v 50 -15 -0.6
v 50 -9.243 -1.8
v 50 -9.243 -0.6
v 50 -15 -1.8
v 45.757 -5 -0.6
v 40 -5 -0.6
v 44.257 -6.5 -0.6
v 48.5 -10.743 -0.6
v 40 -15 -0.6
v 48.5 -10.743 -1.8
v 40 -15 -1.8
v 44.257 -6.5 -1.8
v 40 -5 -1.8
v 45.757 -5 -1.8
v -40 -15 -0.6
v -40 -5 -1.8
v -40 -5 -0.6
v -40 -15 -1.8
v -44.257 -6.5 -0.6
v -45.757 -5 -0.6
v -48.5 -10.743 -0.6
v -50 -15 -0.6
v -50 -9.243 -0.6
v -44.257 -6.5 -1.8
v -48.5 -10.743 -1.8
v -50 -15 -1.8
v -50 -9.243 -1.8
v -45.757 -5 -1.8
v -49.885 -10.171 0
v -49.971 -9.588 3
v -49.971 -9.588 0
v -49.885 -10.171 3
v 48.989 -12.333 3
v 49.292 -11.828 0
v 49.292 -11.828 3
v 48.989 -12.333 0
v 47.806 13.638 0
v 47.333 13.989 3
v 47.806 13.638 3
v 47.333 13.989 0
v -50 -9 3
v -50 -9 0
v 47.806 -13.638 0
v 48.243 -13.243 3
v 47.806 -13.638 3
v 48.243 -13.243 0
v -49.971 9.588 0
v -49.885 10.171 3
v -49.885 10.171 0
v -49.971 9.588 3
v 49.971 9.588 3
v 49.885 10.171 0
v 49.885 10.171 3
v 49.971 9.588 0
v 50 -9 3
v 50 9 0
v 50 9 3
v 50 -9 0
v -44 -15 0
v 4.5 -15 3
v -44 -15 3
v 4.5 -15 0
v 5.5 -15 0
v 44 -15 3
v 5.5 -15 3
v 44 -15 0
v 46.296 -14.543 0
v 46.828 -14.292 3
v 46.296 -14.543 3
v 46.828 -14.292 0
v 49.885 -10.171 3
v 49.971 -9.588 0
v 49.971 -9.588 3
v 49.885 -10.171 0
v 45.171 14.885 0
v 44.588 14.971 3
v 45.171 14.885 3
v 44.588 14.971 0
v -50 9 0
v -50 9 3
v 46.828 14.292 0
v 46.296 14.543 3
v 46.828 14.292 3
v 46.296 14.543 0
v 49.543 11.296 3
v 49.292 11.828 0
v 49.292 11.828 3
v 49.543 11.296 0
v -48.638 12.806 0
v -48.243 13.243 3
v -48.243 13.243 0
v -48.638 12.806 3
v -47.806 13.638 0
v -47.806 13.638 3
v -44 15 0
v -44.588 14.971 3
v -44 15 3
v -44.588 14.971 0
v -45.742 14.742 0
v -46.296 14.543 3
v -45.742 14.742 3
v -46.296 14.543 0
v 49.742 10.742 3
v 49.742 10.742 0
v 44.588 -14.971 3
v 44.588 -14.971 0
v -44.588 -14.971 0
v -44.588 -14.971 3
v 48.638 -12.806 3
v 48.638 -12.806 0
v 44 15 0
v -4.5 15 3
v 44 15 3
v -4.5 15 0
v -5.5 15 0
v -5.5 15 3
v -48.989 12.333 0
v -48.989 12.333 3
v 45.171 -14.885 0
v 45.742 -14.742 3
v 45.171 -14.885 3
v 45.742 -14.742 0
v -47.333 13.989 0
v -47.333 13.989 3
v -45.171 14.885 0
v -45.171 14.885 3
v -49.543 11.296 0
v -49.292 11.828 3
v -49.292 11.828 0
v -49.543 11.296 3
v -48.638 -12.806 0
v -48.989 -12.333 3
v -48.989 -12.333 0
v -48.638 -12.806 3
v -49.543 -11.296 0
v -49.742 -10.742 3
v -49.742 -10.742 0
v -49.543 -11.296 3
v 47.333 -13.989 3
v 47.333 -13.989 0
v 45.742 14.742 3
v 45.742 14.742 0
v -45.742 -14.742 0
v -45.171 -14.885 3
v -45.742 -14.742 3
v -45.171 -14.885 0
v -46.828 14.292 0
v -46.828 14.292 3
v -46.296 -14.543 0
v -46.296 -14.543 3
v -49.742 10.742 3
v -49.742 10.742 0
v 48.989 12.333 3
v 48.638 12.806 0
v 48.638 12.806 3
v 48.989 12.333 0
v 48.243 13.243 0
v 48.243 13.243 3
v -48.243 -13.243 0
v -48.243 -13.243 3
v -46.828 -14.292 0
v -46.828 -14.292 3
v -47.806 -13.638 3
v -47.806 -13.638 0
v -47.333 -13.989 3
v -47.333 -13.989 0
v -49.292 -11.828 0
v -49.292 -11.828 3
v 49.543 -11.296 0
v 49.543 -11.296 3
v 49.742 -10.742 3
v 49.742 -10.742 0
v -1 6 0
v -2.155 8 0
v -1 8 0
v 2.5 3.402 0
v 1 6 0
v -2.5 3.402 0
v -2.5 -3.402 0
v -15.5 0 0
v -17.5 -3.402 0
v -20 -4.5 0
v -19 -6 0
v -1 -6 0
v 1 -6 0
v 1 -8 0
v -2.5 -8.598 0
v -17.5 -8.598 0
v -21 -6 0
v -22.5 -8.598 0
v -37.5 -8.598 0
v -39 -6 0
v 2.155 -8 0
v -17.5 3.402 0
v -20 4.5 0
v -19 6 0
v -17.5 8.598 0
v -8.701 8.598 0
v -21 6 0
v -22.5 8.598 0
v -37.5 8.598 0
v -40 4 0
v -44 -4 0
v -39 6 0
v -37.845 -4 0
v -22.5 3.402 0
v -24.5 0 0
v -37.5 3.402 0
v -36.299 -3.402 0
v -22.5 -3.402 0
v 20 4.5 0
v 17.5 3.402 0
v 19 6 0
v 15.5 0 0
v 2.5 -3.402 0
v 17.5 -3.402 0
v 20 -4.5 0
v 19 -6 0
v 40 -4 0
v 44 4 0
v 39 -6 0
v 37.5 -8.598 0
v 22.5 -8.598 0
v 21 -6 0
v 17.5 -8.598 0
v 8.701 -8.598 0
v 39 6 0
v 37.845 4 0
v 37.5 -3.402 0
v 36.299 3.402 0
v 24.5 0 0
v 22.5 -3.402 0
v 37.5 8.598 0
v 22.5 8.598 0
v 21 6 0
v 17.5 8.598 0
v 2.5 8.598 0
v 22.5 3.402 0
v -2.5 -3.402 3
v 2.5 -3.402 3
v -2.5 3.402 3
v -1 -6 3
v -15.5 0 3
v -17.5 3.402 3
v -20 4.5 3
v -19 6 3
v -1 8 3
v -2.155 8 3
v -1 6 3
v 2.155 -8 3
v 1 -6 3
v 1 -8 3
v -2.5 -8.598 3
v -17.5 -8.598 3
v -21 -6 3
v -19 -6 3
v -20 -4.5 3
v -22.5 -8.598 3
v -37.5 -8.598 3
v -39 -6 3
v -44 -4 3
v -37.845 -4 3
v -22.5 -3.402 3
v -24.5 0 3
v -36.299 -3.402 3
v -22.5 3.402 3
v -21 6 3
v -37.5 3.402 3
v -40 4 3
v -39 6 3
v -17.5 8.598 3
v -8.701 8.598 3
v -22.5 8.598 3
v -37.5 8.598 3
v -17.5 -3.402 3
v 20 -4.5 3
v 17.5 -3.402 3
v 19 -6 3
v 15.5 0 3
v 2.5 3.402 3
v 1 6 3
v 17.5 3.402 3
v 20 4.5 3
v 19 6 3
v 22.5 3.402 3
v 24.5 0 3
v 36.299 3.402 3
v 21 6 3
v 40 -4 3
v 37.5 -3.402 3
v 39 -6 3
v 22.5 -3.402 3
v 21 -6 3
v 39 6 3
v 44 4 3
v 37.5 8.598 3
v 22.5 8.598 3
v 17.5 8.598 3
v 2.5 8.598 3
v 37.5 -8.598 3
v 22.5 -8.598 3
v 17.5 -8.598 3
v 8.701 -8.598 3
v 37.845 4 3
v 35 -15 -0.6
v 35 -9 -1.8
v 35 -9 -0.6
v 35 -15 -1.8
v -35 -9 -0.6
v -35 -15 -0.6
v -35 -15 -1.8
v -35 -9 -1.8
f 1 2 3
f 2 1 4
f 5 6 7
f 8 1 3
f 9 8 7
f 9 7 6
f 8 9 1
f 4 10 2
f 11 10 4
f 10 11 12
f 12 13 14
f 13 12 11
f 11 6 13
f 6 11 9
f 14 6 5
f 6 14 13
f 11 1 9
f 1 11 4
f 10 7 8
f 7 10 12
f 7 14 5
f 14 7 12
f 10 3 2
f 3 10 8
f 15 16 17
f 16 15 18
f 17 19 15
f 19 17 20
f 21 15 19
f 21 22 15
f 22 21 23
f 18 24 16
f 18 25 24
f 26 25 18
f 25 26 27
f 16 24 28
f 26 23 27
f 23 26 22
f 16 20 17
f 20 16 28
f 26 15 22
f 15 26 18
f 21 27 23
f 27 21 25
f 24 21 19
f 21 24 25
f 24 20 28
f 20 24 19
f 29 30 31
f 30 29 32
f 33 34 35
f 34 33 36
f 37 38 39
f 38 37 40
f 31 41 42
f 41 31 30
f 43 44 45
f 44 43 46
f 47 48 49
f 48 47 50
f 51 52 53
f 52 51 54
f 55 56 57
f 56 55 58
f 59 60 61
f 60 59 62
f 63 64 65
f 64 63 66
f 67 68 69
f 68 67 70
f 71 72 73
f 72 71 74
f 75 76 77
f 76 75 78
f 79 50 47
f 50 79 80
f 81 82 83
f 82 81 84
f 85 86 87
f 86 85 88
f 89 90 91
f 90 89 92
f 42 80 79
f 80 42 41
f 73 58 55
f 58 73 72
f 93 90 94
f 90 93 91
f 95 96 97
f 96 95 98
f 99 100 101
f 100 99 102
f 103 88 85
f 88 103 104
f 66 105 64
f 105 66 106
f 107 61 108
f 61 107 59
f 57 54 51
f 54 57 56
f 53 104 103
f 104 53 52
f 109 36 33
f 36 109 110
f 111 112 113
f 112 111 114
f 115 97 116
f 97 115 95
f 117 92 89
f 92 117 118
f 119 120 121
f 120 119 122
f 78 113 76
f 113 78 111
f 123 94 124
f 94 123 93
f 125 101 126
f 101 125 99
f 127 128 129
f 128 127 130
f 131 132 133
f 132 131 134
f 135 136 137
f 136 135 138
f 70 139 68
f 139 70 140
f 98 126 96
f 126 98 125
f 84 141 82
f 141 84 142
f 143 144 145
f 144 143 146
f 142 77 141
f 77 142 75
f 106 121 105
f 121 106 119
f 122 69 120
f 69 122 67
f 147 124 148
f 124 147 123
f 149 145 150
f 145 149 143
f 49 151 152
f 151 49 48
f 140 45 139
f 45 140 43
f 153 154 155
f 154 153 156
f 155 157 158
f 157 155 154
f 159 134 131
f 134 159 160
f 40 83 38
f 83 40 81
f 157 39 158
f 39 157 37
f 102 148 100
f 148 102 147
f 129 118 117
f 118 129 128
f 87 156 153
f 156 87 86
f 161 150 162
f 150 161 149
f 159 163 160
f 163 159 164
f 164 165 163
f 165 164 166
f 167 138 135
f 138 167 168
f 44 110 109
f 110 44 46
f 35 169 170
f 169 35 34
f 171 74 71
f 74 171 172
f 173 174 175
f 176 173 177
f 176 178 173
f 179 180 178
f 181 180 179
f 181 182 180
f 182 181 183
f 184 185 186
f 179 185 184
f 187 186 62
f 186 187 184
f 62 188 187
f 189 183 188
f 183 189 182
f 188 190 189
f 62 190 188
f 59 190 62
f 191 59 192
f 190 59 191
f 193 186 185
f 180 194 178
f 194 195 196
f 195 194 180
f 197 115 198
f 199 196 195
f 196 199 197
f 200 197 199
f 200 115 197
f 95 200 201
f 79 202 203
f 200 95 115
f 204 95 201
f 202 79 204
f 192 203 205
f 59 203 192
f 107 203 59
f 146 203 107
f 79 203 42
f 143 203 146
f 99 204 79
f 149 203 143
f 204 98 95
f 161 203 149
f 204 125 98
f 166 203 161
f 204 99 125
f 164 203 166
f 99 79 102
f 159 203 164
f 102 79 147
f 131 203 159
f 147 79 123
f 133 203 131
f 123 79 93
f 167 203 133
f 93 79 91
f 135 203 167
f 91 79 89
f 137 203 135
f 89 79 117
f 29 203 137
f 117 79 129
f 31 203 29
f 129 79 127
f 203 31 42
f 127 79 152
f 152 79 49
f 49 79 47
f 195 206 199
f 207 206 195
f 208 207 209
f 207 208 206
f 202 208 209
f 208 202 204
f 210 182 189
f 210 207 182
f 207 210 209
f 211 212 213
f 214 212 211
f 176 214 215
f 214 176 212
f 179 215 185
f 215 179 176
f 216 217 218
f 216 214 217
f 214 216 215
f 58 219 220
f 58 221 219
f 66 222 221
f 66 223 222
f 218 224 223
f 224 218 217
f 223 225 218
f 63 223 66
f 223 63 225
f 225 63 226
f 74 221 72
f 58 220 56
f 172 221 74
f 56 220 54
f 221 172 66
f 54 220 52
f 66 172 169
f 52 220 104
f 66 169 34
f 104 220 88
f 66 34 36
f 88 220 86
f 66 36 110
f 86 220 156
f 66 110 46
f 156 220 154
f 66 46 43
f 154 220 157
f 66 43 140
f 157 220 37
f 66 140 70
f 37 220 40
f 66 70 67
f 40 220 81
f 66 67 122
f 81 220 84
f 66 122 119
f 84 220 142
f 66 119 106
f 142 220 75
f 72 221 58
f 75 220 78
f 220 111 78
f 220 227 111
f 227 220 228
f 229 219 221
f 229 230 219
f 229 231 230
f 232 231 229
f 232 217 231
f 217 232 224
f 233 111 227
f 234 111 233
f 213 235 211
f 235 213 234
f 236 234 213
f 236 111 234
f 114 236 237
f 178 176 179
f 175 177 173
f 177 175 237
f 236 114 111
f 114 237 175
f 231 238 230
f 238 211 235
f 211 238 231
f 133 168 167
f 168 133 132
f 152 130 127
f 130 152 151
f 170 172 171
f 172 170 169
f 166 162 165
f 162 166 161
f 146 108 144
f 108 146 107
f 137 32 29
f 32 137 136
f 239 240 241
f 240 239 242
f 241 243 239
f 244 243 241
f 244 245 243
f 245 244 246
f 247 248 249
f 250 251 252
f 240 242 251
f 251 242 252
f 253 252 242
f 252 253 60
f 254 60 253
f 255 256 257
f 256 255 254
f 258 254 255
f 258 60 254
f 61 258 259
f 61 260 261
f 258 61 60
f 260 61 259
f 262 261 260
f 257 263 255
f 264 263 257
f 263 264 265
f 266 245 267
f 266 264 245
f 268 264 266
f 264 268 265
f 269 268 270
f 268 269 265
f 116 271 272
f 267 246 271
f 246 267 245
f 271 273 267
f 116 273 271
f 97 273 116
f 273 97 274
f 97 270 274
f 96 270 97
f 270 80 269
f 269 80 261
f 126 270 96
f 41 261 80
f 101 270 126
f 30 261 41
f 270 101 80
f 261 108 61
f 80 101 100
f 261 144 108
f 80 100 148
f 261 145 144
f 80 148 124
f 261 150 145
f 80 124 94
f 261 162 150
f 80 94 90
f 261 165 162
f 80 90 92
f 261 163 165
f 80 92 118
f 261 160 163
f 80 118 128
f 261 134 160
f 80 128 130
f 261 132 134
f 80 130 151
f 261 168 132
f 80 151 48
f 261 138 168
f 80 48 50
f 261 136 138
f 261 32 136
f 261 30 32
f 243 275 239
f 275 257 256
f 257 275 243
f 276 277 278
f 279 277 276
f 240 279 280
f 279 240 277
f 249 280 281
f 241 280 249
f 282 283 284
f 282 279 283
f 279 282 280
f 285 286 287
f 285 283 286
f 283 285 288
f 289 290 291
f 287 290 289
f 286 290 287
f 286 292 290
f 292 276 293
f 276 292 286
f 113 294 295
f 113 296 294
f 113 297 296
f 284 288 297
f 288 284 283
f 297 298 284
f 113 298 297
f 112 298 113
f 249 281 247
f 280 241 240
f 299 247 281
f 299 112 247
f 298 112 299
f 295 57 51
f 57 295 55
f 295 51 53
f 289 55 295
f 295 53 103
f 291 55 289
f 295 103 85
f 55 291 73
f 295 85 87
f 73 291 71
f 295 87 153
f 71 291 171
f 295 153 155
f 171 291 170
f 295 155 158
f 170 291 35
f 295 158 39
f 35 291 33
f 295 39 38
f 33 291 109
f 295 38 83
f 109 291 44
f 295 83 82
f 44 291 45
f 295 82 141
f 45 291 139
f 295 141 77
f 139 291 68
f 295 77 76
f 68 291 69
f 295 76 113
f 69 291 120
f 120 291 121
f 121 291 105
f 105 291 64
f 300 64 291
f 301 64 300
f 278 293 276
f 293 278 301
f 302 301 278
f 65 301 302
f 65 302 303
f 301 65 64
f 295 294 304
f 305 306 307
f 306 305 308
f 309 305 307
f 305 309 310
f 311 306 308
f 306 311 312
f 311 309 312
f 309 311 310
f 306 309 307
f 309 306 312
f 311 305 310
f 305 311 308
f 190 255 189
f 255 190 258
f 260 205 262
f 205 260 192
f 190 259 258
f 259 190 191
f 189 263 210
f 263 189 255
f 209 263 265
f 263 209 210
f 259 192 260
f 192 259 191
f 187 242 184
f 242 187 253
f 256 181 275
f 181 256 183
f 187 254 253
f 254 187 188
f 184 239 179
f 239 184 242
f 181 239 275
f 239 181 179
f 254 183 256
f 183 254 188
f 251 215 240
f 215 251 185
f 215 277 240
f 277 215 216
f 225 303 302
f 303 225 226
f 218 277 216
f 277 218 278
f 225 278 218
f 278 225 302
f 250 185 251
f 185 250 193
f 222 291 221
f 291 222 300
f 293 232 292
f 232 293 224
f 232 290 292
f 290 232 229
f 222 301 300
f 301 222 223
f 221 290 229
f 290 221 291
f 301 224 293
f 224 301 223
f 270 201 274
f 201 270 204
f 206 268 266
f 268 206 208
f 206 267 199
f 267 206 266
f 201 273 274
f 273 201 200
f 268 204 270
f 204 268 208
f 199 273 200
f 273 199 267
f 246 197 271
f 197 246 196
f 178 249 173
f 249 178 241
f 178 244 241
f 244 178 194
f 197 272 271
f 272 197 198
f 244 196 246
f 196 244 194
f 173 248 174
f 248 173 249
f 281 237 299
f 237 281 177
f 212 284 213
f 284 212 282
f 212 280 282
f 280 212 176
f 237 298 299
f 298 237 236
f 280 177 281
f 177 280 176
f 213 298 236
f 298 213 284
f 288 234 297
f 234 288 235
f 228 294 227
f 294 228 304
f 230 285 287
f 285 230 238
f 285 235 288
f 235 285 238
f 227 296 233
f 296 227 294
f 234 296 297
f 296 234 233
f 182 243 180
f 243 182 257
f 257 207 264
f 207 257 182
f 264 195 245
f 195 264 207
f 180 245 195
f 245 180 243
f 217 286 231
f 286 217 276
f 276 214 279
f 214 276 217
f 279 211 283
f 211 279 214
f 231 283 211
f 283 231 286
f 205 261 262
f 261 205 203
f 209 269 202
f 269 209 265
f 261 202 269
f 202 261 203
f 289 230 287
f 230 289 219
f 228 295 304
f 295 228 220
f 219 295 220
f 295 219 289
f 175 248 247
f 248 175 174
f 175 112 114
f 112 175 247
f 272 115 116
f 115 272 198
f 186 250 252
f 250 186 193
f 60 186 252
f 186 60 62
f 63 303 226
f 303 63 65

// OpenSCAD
$fn=64;

L = 100;
W = 30;
T = 3;

corner_r = 6;

step_len = 70;
step_w = 6;
step_h = 1.2;

chamfer_block_len = 10;
chamfer_block_w = 10;
chamfer_block_h = 1.2;
chamfer = 3;

module rounded_rect_2d(l, w, r){
    hull(){
        translate([ l/2 - r,  w/2 - r]) circle(r=r);
        translate([-l/2 + r,  w/2 - r]) circle(r=r);
        translate([ l/2 - r, -w/2 + r]) circle(r=r);
        translate([-l/2 + r, -w/2 + r]) circle(r=r);
    }
}

module plate_body(){
    linear_extrude(height=T)
        rounded_rect_2d(L, W, corner_r);
}

module stepped_base(){
    translate([0, -W/2 + step_w/2, -step_h])
        cube([step_len, step_w, step_h], center=true);
}

module chamfer_block(signx=1){
    x0 = signx*(L/2 - chamfer_block_len/2);
    y0 = -W/2 + chamfer_block_w/2;
    translate([x0, y0, -chamfer_block_h])
    difference(){
        cube([chamfer_block_len, chamfer_block_w, chamfer_block_h], center=true);
        translate([signx*(chamfer_block_len/2 - chamfer/2), chamfer_block_w/2 - chamfer/2, 0])
            rotate([0,0,45])
                cube([chamfer*2, chamfer*2, chamfer_block_h+0.2], center=true);
    }
}

module hex_slot_2d(len=18, w=6){
    r = w/2;
    hull(){
        translate([-len/2 + r, 0]) circle(r=r, $fn=6);
        translate([ len/2 - r, 0]) circle(r=r, $fn=6);
    }
}

module diamond_2d(w=8, h=8){
    polygon(points=[[0,h/2],[w/2,0],[0,-h/2],[-w/2,0]]);
}

module tri_2d(s=8){
    polygon(points=[[0,s/2],[-s/2,-s/2],[s/2,-s/2]]);
}

module cutouts(){
    union(){
        for (yy = [-6, 6]){
            for (xx = [-30, -10, 10, 30]){
                translate([xx, yy, -0.2])
                    linear_extrude(height=T+0.4)
                        hex_slot_2d(len=18, w=6);
            }
        }

        for (xx = [-20, 20]){
            translate([xx, 0, -0.2])
                linear_extrude(height=T+0.4)
                    diamond_2d(w=9, h=9);
        }

        for (p = [[-40, 0, 0], [40, 0, 180], [-5, 12, 0], [5, -12, 180]]){
            translate([p[0], p[1], -0.2])
                rotate([0,0,p[2]])
                    linear_extrude(height=T+0.4)
                        tri_2d(s=8);
        }
    }
}

difference(){
    union(){
        plate_body();
        stepped_base();
        chamfer_block(1);
        chamfer_block(-1);
    }
    cutouts();
}
